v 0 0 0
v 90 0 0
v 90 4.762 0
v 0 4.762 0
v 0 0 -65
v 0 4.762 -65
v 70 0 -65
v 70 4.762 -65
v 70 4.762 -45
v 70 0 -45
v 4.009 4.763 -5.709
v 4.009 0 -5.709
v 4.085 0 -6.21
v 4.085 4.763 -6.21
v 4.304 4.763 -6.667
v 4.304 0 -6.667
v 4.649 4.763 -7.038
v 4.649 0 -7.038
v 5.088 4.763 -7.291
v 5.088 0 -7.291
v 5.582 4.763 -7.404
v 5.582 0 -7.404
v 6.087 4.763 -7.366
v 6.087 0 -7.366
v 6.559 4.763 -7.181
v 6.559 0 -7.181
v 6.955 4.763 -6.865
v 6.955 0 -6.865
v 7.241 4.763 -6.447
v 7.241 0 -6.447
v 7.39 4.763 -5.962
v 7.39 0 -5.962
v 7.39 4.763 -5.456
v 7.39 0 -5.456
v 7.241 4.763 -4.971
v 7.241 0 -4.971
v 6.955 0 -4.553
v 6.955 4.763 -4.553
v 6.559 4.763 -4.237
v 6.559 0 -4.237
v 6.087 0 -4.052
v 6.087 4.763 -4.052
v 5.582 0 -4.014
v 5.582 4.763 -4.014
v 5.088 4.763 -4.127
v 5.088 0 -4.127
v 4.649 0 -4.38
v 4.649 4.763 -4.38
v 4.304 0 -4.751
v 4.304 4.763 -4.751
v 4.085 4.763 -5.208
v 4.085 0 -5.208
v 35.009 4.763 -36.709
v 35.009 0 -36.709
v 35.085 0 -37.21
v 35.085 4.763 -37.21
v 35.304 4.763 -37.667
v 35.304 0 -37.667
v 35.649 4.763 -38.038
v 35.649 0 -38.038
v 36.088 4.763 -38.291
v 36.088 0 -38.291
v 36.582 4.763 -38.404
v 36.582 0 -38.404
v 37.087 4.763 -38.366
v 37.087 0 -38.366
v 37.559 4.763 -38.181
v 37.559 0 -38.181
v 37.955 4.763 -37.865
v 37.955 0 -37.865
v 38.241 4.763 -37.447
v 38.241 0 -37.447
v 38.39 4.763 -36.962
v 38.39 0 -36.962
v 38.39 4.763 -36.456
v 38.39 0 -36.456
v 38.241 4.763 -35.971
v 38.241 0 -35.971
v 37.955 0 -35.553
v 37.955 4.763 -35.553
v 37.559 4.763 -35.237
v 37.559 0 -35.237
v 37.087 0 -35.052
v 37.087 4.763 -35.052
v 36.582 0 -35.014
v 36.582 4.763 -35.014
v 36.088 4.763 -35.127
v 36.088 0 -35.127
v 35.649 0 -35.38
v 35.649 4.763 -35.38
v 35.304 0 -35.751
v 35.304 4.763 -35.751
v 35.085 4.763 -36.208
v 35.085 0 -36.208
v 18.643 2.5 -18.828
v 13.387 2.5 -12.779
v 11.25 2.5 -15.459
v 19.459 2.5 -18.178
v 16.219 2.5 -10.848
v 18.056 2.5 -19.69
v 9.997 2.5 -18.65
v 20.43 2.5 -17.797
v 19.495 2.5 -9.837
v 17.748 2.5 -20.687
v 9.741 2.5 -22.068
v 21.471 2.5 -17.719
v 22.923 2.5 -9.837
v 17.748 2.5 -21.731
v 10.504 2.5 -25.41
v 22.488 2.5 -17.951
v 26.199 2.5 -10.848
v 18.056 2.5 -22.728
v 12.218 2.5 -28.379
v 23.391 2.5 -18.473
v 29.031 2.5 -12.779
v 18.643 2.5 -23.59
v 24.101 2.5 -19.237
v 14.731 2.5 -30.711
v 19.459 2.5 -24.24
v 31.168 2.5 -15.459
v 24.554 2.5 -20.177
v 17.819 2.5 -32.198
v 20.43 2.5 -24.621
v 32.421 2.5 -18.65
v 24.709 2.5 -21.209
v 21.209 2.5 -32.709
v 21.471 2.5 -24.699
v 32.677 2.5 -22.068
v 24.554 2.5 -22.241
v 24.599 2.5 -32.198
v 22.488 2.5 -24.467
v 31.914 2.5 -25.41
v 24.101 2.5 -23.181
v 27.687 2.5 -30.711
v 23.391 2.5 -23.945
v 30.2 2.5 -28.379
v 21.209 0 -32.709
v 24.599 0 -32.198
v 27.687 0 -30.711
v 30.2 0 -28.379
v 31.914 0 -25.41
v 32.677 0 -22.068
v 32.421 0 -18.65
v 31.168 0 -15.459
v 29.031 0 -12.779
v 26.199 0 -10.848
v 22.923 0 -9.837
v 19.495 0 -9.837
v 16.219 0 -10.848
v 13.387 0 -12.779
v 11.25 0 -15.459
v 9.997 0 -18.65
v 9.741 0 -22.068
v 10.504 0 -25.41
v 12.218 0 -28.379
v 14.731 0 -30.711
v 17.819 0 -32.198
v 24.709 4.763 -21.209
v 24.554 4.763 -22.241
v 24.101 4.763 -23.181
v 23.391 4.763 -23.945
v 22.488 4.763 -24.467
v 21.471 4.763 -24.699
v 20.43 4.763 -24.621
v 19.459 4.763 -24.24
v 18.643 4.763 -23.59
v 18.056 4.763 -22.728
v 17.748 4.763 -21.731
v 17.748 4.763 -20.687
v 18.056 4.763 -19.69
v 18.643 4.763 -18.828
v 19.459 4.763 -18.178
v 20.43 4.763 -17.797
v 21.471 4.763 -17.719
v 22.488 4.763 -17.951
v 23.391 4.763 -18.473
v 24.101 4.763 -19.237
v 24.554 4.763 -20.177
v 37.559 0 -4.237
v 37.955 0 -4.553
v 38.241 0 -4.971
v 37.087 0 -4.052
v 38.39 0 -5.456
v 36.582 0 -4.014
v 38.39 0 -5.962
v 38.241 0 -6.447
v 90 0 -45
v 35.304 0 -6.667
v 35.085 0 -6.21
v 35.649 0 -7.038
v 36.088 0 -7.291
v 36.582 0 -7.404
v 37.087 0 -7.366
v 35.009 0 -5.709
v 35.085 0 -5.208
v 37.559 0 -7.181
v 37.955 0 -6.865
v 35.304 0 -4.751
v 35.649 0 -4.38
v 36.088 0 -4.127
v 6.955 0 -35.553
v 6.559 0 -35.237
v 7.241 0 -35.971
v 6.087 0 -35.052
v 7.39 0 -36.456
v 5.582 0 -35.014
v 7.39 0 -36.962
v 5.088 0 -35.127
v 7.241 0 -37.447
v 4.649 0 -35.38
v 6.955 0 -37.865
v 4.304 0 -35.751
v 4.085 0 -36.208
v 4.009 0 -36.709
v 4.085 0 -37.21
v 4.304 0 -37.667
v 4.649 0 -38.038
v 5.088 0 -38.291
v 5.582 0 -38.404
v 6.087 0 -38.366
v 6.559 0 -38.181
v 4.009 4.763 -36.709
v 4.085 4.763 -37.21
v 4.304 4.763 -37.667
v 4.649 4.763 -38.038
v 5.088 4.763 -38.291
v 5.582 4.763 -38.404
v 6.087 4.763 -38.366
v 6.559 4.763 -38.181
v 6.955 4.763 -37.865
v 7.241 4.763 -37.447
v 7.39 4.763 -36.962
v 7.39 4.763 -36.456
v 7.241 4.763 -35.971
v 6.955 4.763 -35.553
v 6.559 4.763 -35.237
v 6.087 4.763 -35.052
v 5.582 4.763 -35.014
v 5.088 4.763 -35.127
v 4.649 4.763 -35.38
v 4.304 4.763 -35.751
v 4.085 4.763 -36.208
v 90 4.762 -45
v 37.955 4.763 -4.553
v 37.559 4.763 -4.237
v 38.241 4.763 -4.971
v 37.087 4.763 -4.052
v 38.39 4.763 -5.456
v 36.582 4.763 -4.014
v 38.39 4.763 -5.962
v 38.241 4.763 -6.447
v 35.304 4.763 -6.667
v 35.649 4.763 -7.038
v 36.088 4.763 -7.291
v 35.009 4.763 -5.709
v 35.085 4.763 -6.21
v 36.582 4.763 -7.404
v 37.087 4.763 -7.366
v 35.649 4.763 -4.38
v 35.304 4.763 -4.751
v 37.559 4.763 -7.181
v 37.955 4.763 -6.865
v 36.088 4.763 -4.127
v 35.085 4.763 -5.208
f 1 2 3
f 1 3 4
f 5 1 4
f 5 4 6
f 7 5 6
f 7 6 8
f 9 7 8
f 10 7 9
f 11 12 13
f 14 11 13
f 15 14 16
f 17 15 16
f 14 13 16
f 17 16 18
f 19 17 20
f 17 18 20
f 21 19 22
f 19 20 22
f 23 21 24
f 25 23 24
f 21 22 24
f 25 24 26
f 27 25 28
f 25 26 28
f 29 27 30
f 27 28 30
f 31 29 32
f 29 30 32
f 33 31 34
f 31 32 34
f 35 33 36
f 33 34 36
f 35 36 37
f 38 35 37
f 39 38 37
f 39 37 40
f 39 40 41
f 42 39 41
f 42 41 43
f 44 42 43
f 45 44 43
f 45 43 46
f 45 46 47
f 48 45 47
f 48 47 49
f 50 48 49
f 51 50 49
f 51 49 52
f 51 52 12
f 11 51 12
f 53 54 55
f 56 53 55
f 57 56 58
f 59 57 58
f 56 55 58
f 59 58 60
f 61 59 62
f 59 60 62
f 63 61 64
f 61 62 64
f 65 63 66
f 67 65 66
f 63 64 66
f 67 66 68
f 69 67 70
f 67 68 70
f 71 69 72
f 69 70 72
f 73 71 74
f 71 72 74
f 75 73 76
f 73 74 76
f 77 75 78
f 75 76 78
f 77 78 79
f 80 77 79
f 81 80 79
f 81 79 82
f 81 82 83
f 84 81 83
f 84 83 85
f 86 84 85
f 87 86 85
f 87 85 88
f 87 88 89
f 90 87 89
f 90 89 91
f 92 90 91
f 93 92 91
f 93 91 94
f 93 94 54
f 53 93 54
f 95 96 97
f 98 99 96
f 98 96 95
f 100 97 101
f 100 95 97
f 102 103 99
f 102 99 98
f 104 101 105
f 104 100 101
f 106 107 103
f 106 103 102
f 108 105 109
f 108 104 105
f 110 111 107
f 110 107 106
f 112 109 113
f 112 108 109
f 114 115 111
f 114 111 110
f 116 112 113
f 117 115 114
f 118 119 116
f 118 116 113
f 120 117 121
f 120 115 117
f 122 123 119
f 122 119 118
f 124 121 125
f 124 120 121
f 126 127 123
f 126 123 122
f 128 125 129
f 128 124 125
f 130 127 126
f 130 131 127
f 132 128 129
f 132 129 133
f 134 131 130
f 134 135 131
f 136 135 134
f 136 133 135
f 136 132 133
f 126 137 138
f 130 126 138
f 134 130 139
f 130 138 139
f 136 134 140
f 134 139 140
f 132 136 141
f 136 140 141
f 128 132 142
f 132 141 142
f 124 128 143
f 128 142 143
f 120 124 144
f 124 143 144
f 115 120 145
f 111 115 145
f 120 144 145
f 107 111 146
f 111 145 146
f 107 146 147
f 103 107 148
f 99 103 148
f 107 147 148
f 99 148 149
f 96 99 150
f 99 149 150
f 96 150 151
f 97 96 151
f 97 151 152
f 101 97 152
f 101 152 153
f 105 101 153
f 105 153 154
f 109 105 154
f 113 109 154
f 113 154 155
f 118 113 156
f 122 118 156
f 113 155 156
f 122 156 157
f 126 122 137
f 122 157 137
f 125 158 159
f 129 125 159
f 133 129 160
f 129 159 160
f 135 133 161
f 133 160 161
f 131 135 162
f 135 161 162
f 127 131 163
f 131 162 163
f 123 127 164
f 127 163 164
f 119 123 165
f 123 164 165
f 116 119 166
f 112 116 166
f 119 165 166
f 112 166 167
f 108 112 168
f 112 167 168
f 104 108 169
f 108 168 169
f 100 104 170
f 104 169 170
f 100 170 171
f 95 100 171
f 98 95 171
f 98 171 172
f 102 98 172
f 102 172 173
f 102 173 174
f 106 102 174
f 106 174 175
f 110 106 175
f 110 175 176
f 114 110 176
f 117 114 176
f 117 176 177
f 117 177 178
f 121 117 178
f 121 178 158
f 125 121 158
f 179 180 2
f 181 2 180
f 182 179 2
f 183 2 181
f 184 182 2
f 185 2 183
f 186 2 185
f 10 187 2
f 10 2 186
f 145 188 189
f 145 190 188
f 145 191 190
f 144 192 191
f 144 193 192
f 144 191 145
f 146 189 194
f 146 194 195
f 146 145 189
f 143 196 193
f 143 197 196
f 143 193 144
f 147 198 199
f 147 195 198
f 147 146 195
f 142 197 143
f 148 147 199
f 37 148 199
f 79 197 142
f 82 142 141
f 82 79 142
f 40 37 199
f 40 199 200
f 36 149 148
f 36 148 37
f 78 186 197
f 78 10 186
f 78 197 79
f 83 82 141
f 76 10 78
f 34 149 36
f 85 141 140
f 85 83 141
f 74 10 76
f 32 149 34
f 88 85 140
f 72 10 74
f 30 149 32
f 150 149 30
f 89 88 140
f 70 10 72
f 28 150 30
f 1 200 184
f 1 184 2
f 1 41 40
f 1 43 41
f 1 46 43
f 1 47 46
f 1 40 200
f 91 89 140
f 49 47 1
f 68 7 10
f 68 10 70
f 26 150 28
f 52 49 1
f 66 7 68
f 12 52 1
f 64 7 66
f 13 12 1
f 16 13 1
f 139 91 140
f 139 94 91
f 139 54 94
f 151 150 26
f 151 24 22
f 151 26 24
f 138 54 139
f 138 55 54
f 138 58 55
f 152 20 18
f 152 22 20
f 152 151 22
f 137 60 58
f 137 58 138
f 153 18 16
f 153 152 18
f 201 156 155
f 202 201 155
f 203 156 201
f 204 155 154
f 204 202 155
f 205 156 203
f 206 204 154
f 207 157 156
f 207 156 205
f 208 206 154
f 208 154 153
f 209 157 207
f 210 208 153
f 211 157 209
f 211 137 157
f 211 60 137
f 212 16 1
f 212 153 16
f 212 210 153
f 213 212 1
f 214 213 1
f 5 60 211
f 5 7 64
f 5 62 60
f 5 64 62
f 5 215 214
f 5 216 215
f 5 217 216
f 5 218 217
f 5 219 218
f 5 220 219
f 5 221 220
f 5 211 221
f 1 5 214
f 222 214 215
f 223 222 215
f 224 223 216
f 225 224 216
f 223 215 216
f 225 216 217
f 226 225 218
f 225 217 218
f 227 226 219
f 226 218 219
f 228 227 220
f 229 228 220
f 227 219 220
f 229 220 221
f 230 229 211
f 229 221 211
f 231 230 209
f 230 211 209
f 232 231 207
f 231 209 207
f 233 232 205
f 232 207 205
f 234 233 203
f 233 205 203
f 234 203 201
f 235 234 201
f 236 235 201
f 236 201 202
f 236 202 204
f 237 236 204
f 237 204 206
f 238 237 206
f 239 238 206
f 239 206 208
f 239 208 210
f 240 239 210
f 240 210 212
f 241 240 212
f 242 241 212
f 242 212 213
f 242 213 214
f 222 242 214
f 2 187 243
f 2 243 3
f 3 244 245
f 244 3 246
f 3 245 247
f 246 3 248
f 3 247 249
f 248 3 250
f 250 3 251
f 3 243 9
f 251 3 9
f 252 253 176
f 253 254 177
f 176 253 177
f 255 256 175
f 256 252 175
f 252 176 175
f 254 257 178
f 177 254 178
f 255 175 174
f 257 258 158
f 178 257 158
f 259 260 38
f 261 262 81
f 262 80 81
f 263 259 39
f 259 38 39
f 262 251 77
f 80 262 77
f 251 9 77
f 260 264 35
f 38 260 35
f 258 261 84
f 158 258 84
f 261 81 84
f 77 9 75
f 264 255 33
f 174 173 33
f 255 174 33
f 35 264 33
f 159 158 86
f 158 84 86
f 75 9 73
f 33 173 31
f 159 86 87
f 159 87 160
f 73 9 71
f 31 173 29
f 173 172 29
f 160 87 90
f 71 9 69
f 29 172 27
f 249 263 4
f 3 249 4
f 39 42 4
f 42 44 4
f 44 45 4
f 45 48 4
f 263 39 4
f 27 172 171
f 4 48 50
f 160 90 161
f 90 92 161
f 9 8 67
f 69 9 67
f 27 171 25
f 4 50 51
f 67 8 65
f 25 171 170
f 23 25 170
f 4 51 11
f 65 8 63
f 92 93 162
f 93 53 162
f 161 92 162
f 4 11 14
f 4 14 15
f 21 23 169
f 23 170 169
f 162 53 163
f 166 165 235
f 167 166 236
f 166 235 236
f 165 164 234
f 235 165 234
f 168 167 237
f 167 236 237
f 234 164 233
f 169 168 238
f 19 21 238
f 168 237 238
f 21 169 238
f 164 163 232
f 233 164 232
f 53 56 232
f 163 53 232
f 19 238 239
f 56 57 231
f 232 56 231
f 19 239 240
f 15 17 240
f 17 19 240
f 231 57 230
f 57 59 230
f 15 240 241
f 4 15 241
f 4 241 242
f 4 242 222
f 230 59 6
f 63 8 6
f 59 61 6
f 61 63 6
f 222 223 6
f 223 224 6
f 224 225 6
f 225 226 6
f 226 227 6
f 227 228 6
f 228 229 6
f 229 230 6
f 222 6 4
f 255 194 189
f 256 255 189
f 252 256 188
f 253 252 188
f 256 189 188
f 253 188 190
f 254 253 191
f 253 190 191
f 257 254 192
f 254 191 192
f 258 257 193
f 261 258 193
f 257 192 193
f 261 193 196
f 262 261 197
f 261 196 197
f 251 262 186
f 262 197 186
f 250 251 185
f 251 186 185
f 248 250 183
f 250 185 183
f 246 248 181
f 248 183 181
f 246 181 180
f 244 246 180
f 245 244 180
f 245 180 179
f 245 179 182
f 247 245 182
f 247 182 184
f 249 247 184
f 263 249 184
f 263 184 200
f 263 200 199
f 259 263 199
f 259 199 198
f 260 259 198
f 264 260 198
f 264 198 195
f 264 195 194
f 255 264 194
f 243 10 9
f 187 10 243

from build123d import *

# Parameters (mm, degrees)
BOSS_EXTRUDE1_DEPTH      = 4.7625
M3_CLEARANCE_HOLE1_D     = 3.4
F_7_0_7_DIAMETER_HOLE1_D = 7
SKETCH12_R               = 11.5
CUT_EXTRUDE1_DEPTH       = 2.5


with BuildPart() as part:
    # Sketch1 → Boss-Extrude1 (new body)
    with BuildSketch(Plane(origin=(0, 0, 0), x_dir=(1, 0, 0), z_dir=(0, 1, 0))):
        Polygon((70, 65), (70, 45), (90, 45), (90, 0), (0, 0), (0, 65), align=None)
    extrude(amount=BOSS_EXTRUDE1_DEPTH)

    # M3 Clearance Hole1 (through all)
    with Locations(Plane(origin=(0, 4.7625, 0), x_dir=(1, 0, 0), z_dir=(0, 1, 0))):
        with Locations((36.709, 5.709), (36.709, 36.709), (5.709, 36.709), (5.709, 5.709)):
            Hole(M3_CLEARANCE_HOLE1_D / 2)

    # Ø7.0 (7) Diameter Hole1 (through all)
    with Locations(Plane(origin=(0, 0, 0), x_dir=(-1, 0, 0), z_dir=(0, -1, 0))):
        with Locations((-21.209, 21.209)):
            Hole(F_7_0_7_DIAMETER_HOLE1_D / 2)

    # Sketch12 → Cut-Extrude1 (cut)
    with BuildSketch(Plane.XZ):
        with Locations(Location((21.209, -21.209, 0), (0, 0, 270))):
            Circle(SKETCH12_R)
    extrude(amount=-CUT_EXTRUDE1_DEPTH, mode=Mode.SUBTRACT)


solid = part.part
